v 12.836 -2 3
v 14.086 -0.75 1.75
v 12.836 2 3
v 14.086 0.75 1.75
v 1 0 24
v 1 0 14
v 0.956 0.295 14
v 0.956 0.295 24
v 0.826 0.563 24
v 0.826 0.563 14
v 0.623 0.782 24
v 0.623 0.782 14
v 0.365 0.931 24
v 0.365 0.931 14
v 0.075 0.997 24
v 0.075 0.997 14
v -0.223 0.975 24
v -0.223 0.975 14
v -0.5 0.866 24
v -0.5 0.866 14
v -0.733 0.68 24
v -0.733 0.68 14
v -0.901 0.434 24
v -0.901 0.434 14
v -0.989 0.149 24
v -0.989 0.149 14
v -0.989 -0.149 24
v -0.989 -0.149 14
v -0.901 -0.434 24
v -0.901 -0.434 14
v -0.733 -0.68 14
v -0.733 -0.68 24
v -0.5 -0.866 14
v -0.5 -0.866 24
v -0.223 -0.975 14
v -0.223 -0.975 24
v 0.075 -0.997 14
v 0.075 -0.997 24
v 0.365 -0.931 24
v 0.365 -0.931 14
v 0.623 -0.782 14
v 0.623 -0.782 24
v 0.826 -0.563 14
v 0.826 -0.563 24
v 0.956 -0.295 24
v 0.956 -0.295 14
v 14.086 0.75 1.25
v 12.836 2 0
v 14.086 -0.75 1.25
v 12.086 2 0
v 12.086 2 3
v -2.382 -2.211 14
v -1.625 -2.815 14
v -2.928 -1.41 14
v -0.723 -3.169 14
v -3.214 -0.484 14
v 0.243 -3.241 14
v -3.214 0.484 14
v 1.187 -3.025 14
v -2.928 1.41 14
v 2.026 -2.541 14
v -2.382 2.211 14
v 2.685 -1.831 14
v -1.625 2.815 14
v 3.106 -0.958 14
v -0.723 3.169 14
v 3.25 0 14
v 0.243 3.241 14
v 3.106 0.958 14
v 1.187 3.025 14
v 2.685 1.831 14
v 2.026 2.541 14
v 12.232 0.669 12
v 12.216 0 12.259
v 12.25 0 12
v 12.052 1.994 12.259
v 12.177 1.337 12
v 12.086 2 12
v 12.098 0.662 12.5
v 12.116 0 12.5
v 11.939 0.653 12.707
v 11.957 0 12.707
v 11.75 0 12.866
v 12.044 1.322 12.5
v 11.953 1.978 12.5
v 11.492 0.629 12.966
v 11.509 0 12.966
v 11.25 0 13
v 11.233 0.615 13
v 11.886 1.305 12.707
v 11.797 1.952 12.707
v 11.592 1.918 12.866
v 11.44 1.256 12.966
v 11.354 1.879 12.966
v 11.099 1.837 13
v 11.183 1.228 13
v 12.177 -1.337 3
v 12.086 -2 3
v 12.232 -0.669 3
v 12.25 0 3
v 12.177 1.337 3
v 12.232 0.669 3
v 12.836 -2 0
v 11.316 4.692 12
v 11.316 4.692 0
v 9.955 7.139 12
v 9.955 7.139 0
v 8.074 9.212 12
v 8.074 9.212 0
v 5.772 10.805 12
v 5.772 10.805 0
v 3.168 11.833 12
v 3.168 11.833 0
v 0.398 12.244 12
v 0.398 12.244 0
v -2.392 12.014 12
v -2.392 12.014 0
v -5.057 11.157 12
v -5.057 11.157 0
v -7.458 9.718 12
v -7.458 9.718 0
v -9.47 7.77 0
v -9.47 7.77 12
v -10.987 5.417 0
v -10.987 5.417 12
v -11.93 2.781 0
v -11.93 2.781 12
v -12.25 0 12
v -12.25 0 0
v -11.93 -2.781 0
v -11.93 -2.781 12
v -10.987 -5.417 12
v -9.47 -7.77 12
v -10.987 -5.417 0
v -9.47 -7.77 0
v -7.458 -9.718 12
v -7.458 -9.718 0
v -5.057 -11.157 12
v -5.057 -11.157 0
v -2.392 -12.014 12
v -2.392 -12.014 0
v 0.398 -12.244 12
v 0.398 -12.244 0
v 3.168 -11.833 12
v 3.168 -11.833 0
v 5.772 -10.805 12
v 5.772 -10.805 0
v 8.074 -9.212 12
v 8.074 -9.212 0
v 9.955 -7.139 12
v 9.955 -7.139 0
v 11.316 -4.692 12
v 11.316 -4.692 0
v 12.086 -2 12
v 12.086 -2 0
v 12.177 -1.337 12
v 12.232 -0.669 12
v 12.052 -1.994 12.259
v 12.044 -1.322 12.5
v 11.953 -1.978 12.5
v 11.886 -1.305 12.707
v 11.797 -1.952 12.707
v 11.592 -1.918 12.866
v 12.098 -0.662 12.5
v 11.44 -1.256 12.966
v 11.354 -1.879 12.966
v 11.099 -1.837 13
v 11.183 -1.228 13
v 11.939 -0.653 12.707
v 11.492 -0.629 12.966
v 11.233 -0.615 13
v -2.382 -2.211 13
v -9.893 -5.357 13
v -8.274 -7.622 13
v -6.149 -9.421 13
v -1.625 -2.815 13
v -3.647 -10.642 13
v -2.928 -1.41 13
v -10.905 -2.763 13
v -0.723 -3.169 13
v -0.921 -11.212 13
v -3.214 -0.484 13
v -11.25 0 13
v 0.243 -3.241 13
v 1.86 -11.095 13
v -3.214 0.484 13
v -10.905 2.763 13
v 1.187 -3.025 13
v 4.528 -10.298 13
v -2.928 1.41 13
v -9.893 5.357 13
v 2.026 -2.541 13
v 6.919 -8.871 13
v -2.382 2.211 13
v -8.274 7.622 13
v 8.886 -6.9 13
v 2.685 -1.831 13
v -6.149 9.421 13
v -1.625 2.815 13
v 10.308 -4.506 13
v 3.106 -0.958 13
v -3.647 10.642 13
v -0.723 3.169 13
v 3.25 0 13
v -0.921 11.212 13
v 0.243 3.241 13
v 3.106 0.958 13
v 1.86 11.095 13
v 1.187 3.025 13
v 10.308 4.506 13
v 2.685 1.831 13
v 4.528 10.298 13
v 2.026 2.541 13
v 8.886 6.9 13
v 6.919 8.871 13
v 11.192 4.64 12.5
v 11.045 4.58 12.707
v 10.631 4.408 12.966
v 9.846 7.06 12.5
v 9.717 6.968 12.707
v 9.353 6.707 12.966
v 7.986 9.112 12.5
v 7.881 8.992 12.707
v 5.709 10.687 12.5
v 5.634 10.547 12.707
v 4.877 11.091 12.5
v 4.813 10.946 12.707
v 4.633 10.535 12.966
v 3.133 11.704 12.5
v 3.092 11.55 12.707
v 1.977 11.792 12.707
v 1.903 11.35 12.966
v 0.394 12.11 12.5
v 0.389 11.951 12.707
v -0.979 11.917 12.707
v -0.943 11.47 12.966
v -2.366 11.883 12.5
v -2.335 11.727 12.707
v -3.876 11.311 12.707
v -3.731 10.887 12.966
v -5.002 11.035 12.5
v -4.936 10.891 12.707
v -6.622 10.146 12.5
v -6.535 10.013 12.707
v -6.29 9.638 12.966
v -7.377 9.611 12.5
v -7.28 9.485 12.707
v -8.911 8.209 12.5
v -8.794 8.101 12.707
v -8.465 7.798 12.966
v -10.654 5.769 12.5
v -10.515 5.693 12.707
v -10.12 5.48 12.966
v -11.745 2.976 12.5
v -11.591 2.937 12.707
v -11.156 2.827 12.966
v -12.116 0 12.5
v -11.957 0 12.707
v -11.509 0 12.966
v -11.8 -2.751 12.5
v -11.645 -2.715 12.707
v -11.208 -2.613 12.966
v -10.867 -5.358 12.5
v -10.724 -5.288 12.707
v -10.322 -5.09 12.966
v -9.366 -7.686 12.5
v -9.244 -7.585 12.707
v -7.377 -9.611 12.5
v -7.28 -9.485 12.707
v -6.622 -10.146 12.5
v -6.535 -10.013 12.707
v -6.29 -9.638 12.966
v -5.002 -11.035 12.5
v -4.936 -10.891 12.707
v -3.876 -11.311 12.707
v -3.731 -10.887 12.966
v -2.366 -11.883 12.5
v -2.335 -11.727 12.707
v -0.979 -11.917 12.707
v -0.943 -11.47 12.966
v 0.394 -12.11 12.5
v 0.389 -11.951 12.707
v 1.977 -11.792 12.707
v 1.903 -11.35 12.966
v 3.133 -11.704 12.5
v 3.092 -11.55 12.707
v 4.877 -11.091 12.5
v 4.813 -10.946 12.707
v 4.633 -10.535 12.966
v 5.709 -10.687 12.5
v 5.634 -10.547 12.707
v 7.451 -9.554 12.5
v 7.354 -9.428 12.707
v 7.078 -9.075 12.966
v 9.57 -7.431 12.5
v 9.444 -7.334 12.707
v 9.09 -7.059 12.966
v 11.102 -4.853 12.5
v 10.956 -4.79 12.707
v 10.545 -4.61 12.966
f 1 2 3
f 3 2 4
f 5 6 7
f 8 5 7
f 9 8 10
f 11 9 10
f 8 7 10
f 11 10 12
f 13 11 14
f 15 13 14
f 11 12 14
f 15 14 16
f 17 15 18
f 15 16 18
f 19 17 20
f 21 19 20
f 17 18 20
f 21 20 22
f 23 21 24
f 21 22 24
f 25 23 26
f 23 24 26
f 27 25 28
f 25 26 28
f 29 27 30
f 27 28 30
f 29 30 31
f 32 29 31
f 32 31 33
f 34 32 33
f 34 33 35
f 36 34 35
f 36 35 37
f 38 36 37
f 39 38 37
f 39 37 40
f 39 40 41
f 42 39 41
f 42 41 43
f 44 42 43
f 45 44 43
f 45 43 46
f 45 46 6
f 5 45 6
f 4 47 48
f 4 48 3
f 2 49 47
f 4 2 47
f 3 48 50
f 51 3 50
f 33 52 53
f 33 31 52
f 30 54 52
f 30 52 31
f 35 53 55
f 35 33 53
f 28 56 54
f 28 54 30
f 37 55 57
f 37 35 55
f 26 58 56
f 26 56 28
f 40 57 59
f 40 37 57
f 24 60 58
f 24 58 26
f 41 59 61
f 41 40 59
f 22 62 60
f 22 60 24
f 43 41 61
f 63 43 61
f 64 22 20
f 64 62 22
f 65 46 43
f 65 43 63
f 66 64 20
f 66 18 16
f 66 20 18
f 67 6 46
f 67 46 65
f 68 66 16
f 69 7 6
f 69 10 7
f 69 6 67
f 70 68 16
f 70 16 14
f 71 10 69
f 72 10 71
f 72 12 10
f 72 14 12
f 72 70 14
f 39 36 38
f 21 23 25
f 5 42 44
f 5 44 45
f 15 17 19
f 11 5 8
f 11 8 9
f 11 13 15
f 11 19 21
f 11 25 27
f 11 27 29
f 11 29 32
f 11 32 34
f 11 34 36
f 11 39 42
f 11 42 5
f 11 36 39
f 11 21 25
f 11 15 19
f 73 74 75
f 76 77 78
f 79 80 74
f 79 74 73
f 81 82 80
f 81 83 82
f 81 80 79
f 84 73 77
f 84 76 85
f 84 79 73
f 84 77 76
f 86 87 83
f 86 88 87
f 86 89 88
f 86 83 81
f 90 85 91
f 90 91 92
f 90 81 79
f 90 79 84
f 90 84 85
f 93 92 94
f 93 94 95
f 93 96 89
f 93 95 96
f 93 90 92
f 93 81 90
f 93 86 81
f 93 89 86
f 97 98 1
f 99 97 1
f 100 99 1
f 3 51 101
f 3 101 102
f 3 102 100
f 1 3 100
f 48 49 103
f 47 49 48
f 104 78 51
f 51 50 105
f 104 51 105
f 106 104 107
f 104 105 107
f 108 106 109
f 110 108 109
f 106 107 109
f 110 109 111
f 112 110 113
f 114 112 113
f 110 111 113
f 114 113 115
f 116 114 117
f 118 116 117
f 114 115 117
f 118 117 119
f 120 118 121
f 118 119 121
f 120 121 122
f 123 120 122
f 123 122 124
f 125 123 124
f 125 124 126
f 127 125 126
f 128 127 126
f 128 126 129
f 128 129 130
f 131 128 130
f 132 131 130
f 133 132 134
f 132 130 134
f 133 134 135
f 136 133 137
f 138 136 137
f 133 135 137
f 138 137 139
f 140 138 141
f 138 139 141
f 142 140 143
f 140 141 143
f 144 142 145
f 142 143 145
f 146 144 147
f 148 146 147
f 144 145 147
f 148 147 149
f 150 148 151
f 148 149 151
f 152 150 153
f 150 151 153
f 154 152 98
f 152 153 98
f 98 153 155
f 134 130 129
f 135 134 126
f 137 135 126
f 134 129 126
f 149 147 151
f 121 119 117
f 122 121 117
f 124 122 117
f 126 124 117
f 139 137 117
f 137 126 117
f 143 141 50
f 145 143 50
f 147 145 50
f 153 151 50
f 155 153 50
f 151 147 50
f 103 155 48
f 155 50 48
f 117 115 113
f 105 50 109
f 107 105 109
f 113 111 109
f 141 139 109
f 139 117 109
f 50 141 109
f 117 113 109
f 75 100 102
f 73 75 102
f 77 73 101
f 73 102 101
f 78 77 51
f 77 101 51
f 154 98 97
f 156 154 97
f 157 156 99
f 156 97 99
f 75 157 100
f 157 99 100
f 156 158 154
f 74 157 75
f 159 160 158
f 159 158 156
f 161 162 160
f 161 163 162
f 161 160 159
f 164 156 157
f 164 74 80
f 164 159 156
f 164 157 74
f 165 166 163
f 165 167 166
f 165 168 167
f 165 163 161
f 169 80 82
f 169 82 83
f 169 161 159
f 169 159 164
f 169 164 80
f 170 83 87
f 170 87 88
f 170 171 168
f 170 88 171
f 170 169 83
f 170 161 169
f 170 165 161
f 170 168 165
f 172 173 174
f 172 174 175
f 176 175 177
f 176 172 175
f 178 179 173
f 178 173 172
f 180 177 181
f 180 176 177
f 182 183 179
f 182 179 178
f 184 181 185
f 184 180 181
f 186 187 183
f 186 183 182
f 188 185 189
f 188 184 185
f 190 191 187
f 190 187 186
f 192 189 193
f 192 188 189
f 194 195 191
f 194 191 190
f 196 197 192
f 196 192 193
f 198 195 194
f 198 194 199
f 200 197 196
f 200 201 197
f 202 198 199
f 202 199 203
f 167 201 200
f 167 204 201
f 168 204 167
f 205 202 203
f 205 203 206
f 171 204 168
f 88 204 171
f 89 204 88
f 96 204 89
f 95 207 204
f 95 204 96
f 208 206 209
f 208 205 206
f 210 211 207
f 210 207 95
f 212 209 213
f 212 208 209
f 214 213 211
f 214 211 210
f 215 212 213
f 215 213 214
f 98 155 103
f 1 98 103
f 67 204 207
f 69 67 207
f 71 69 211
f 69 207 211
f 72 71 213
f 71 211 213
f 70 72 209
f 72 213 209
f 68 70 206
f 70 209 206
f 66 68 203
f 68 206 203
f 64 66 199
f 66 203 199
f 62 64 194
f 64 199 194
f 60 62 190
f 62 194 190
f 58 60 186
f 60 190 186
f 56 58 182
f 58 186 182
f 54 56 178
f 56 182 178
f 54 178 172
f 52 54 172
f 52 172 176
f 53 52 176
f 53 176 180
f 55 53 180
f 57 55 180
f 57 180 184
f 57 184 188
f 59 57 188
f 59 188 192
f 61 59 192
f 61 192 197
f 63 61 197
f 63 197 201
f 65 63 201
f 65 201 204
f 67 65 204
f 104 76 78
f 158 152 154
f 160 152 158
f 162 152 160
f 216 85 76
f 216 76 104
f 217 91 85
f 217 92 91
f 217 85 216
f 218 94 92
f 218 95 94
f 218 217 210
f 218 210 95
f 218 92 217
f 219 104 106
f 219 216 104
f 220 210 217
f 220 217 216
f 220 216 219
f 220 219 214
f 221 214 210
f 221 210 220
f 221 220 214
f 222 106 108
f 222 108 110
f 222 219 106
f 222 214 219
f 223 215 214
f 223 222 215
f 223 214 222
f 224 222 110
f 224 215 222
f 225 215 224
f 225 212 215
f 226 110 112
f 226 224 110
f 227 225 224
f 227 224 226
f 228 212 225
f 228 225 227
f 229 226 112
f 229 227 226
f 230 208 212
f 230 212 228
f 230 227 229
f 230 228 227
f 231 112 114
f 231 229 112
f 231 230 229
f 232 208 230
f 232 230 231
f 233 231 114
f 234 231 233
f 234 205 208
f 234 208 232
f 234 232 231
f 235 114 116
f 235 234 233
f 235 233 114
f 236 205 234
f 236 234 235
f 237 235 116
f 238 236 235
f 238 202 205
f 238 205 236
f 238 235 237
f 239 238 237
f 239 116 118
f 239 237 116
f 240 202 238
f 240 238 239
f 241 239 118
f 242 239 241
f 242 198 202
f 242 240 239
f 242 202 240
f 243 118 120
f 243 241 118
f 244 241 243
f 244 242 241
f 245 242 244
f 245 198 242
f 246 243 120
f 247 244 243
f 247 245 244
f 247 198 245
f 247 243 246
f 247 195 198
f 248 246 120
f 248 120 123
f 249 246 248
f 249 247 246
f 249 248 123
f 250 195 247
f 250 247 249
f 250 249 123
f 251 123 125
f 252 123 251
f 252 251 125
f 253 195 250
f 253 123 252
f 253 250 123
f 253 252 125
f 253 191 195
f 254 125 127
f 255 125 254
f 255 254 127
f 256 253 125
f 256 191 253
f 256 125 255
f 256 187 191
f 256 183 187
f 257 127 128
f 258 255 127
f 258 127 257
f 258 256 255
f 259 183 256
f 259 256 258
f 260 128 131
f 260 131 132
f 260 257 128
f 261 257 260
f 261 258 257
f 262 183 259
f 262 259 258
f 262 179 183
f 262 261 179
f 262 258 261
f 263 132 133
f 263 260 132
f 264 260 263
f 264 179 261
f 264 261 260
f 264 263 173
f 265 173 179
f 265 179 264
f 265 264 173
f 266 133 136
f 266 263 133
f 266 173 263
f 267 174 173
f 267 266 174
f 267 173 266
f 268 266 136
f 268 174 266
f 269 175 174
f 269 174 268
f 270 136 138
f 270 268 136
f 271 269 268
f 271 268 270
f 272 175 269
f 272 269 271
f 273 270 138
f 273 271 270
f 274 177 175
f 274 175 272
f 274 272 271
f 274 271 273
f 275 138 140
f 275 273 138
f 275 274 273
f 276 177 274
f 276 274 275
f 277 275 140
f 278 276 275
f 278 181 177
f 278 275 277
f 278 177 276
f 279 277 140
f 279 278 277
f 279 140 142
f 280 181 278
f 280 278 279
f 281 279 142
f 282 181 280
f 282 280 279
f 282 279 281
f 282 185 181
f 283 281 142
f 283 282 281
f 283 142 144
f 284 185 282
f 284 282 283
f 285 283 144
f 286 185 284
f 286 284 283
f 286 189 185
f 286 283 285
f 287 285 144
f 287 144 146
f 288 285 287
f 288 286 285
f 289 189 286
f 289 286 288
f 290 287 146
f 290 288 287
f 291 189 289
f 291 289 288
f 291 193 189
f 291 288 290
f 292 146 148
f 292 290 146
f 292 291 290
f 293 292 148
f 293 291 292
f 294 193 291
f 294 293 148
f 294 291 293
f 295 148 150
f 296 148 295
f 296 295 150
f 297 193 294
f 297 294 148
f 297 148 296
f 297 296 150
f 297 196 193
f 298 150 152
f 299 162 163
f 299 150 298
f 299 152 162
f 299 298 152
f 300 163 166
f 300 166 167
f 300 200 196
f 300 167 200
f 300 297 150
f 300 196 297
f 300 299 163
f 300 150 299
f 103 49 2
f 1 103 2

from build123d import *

# Parameters (mm, degrees)
F0_R     = 3.25
F1_DEPTH = 13
F0_R_2   = 1
F2_DEPTH = 14
F3_DEPTH = 24
F4_DEPTH = 3
F5_R     = 1
F6_SIZE  = 1.25


with BuildPart() as f1:
    # F0 (on Top) → F1 (new body)
    with BuildSketch(Plane.XY):
        with BuildLine():
            ThreePointArc((12.085632, -2), (12.208839, -1.003371), (12.25, 0))
            ThreePointArc((12.25, 0), (12.208839, 1.003371), (12.085632, 2))
            ThreePointArc((12.085632, 2), (-12.25, 0), (12.085632, -2))
        make_face()
        Circle(F0_R, mode=Mode.SUBTRACT)
    extrude(amount=F1_DEPTH)

    # F0 (on Top) → F2 (join)
    with BuildSketch(Plane.XY):
        Circle(F0_R)
        Circle(F0_R_2, mode=Mode.SUBTRACT)
    extrude(amount=F2_DEPTH)

    # F0 (on Top) → F3 (join)
    with BuildSketch(Plane.XY):
        Circle(F0_R_2)
    extrude(amount=F3_DEPTH)

    # F0 (on Top) → F4 (join)
    with BuildSketch(Plane.XY):
        with BuildLine():
            ThreePointArc((12.085632, 2), (12.208839, 1.003371), (12.25, 0))
            ThreePointArc((12.25, 0), (12.208839, -1.003371), (12.085632, -2))
            Line((12.085632, -2), (14.085632, -2))
            Line((14.085632, -2), (14.085632, 2))
            Line((14.085632, 2), (12.085632, 2))
        make_face()
    extrude(amount=F4_DEPTH)

    # F5
    f5_edges = [f1.edges().sort_by_distance(p)[0] for p in [
        (-12.085632, 2, 13),
    ]]
    fillet(f5_edges, radius=F5_R)

    # F6
    f6_edges = [f1.edges().sort_by_distance(p)[0] for p in [
        (14.085632, -2, 1.5),
        (14.085632, 2, 1.5),
        (14.085632, 0, 0),
        (14.085632, 0, 3),
    ]]
    chamfer(f6_edges, length=F6_SIZE)


solid = f1.part
